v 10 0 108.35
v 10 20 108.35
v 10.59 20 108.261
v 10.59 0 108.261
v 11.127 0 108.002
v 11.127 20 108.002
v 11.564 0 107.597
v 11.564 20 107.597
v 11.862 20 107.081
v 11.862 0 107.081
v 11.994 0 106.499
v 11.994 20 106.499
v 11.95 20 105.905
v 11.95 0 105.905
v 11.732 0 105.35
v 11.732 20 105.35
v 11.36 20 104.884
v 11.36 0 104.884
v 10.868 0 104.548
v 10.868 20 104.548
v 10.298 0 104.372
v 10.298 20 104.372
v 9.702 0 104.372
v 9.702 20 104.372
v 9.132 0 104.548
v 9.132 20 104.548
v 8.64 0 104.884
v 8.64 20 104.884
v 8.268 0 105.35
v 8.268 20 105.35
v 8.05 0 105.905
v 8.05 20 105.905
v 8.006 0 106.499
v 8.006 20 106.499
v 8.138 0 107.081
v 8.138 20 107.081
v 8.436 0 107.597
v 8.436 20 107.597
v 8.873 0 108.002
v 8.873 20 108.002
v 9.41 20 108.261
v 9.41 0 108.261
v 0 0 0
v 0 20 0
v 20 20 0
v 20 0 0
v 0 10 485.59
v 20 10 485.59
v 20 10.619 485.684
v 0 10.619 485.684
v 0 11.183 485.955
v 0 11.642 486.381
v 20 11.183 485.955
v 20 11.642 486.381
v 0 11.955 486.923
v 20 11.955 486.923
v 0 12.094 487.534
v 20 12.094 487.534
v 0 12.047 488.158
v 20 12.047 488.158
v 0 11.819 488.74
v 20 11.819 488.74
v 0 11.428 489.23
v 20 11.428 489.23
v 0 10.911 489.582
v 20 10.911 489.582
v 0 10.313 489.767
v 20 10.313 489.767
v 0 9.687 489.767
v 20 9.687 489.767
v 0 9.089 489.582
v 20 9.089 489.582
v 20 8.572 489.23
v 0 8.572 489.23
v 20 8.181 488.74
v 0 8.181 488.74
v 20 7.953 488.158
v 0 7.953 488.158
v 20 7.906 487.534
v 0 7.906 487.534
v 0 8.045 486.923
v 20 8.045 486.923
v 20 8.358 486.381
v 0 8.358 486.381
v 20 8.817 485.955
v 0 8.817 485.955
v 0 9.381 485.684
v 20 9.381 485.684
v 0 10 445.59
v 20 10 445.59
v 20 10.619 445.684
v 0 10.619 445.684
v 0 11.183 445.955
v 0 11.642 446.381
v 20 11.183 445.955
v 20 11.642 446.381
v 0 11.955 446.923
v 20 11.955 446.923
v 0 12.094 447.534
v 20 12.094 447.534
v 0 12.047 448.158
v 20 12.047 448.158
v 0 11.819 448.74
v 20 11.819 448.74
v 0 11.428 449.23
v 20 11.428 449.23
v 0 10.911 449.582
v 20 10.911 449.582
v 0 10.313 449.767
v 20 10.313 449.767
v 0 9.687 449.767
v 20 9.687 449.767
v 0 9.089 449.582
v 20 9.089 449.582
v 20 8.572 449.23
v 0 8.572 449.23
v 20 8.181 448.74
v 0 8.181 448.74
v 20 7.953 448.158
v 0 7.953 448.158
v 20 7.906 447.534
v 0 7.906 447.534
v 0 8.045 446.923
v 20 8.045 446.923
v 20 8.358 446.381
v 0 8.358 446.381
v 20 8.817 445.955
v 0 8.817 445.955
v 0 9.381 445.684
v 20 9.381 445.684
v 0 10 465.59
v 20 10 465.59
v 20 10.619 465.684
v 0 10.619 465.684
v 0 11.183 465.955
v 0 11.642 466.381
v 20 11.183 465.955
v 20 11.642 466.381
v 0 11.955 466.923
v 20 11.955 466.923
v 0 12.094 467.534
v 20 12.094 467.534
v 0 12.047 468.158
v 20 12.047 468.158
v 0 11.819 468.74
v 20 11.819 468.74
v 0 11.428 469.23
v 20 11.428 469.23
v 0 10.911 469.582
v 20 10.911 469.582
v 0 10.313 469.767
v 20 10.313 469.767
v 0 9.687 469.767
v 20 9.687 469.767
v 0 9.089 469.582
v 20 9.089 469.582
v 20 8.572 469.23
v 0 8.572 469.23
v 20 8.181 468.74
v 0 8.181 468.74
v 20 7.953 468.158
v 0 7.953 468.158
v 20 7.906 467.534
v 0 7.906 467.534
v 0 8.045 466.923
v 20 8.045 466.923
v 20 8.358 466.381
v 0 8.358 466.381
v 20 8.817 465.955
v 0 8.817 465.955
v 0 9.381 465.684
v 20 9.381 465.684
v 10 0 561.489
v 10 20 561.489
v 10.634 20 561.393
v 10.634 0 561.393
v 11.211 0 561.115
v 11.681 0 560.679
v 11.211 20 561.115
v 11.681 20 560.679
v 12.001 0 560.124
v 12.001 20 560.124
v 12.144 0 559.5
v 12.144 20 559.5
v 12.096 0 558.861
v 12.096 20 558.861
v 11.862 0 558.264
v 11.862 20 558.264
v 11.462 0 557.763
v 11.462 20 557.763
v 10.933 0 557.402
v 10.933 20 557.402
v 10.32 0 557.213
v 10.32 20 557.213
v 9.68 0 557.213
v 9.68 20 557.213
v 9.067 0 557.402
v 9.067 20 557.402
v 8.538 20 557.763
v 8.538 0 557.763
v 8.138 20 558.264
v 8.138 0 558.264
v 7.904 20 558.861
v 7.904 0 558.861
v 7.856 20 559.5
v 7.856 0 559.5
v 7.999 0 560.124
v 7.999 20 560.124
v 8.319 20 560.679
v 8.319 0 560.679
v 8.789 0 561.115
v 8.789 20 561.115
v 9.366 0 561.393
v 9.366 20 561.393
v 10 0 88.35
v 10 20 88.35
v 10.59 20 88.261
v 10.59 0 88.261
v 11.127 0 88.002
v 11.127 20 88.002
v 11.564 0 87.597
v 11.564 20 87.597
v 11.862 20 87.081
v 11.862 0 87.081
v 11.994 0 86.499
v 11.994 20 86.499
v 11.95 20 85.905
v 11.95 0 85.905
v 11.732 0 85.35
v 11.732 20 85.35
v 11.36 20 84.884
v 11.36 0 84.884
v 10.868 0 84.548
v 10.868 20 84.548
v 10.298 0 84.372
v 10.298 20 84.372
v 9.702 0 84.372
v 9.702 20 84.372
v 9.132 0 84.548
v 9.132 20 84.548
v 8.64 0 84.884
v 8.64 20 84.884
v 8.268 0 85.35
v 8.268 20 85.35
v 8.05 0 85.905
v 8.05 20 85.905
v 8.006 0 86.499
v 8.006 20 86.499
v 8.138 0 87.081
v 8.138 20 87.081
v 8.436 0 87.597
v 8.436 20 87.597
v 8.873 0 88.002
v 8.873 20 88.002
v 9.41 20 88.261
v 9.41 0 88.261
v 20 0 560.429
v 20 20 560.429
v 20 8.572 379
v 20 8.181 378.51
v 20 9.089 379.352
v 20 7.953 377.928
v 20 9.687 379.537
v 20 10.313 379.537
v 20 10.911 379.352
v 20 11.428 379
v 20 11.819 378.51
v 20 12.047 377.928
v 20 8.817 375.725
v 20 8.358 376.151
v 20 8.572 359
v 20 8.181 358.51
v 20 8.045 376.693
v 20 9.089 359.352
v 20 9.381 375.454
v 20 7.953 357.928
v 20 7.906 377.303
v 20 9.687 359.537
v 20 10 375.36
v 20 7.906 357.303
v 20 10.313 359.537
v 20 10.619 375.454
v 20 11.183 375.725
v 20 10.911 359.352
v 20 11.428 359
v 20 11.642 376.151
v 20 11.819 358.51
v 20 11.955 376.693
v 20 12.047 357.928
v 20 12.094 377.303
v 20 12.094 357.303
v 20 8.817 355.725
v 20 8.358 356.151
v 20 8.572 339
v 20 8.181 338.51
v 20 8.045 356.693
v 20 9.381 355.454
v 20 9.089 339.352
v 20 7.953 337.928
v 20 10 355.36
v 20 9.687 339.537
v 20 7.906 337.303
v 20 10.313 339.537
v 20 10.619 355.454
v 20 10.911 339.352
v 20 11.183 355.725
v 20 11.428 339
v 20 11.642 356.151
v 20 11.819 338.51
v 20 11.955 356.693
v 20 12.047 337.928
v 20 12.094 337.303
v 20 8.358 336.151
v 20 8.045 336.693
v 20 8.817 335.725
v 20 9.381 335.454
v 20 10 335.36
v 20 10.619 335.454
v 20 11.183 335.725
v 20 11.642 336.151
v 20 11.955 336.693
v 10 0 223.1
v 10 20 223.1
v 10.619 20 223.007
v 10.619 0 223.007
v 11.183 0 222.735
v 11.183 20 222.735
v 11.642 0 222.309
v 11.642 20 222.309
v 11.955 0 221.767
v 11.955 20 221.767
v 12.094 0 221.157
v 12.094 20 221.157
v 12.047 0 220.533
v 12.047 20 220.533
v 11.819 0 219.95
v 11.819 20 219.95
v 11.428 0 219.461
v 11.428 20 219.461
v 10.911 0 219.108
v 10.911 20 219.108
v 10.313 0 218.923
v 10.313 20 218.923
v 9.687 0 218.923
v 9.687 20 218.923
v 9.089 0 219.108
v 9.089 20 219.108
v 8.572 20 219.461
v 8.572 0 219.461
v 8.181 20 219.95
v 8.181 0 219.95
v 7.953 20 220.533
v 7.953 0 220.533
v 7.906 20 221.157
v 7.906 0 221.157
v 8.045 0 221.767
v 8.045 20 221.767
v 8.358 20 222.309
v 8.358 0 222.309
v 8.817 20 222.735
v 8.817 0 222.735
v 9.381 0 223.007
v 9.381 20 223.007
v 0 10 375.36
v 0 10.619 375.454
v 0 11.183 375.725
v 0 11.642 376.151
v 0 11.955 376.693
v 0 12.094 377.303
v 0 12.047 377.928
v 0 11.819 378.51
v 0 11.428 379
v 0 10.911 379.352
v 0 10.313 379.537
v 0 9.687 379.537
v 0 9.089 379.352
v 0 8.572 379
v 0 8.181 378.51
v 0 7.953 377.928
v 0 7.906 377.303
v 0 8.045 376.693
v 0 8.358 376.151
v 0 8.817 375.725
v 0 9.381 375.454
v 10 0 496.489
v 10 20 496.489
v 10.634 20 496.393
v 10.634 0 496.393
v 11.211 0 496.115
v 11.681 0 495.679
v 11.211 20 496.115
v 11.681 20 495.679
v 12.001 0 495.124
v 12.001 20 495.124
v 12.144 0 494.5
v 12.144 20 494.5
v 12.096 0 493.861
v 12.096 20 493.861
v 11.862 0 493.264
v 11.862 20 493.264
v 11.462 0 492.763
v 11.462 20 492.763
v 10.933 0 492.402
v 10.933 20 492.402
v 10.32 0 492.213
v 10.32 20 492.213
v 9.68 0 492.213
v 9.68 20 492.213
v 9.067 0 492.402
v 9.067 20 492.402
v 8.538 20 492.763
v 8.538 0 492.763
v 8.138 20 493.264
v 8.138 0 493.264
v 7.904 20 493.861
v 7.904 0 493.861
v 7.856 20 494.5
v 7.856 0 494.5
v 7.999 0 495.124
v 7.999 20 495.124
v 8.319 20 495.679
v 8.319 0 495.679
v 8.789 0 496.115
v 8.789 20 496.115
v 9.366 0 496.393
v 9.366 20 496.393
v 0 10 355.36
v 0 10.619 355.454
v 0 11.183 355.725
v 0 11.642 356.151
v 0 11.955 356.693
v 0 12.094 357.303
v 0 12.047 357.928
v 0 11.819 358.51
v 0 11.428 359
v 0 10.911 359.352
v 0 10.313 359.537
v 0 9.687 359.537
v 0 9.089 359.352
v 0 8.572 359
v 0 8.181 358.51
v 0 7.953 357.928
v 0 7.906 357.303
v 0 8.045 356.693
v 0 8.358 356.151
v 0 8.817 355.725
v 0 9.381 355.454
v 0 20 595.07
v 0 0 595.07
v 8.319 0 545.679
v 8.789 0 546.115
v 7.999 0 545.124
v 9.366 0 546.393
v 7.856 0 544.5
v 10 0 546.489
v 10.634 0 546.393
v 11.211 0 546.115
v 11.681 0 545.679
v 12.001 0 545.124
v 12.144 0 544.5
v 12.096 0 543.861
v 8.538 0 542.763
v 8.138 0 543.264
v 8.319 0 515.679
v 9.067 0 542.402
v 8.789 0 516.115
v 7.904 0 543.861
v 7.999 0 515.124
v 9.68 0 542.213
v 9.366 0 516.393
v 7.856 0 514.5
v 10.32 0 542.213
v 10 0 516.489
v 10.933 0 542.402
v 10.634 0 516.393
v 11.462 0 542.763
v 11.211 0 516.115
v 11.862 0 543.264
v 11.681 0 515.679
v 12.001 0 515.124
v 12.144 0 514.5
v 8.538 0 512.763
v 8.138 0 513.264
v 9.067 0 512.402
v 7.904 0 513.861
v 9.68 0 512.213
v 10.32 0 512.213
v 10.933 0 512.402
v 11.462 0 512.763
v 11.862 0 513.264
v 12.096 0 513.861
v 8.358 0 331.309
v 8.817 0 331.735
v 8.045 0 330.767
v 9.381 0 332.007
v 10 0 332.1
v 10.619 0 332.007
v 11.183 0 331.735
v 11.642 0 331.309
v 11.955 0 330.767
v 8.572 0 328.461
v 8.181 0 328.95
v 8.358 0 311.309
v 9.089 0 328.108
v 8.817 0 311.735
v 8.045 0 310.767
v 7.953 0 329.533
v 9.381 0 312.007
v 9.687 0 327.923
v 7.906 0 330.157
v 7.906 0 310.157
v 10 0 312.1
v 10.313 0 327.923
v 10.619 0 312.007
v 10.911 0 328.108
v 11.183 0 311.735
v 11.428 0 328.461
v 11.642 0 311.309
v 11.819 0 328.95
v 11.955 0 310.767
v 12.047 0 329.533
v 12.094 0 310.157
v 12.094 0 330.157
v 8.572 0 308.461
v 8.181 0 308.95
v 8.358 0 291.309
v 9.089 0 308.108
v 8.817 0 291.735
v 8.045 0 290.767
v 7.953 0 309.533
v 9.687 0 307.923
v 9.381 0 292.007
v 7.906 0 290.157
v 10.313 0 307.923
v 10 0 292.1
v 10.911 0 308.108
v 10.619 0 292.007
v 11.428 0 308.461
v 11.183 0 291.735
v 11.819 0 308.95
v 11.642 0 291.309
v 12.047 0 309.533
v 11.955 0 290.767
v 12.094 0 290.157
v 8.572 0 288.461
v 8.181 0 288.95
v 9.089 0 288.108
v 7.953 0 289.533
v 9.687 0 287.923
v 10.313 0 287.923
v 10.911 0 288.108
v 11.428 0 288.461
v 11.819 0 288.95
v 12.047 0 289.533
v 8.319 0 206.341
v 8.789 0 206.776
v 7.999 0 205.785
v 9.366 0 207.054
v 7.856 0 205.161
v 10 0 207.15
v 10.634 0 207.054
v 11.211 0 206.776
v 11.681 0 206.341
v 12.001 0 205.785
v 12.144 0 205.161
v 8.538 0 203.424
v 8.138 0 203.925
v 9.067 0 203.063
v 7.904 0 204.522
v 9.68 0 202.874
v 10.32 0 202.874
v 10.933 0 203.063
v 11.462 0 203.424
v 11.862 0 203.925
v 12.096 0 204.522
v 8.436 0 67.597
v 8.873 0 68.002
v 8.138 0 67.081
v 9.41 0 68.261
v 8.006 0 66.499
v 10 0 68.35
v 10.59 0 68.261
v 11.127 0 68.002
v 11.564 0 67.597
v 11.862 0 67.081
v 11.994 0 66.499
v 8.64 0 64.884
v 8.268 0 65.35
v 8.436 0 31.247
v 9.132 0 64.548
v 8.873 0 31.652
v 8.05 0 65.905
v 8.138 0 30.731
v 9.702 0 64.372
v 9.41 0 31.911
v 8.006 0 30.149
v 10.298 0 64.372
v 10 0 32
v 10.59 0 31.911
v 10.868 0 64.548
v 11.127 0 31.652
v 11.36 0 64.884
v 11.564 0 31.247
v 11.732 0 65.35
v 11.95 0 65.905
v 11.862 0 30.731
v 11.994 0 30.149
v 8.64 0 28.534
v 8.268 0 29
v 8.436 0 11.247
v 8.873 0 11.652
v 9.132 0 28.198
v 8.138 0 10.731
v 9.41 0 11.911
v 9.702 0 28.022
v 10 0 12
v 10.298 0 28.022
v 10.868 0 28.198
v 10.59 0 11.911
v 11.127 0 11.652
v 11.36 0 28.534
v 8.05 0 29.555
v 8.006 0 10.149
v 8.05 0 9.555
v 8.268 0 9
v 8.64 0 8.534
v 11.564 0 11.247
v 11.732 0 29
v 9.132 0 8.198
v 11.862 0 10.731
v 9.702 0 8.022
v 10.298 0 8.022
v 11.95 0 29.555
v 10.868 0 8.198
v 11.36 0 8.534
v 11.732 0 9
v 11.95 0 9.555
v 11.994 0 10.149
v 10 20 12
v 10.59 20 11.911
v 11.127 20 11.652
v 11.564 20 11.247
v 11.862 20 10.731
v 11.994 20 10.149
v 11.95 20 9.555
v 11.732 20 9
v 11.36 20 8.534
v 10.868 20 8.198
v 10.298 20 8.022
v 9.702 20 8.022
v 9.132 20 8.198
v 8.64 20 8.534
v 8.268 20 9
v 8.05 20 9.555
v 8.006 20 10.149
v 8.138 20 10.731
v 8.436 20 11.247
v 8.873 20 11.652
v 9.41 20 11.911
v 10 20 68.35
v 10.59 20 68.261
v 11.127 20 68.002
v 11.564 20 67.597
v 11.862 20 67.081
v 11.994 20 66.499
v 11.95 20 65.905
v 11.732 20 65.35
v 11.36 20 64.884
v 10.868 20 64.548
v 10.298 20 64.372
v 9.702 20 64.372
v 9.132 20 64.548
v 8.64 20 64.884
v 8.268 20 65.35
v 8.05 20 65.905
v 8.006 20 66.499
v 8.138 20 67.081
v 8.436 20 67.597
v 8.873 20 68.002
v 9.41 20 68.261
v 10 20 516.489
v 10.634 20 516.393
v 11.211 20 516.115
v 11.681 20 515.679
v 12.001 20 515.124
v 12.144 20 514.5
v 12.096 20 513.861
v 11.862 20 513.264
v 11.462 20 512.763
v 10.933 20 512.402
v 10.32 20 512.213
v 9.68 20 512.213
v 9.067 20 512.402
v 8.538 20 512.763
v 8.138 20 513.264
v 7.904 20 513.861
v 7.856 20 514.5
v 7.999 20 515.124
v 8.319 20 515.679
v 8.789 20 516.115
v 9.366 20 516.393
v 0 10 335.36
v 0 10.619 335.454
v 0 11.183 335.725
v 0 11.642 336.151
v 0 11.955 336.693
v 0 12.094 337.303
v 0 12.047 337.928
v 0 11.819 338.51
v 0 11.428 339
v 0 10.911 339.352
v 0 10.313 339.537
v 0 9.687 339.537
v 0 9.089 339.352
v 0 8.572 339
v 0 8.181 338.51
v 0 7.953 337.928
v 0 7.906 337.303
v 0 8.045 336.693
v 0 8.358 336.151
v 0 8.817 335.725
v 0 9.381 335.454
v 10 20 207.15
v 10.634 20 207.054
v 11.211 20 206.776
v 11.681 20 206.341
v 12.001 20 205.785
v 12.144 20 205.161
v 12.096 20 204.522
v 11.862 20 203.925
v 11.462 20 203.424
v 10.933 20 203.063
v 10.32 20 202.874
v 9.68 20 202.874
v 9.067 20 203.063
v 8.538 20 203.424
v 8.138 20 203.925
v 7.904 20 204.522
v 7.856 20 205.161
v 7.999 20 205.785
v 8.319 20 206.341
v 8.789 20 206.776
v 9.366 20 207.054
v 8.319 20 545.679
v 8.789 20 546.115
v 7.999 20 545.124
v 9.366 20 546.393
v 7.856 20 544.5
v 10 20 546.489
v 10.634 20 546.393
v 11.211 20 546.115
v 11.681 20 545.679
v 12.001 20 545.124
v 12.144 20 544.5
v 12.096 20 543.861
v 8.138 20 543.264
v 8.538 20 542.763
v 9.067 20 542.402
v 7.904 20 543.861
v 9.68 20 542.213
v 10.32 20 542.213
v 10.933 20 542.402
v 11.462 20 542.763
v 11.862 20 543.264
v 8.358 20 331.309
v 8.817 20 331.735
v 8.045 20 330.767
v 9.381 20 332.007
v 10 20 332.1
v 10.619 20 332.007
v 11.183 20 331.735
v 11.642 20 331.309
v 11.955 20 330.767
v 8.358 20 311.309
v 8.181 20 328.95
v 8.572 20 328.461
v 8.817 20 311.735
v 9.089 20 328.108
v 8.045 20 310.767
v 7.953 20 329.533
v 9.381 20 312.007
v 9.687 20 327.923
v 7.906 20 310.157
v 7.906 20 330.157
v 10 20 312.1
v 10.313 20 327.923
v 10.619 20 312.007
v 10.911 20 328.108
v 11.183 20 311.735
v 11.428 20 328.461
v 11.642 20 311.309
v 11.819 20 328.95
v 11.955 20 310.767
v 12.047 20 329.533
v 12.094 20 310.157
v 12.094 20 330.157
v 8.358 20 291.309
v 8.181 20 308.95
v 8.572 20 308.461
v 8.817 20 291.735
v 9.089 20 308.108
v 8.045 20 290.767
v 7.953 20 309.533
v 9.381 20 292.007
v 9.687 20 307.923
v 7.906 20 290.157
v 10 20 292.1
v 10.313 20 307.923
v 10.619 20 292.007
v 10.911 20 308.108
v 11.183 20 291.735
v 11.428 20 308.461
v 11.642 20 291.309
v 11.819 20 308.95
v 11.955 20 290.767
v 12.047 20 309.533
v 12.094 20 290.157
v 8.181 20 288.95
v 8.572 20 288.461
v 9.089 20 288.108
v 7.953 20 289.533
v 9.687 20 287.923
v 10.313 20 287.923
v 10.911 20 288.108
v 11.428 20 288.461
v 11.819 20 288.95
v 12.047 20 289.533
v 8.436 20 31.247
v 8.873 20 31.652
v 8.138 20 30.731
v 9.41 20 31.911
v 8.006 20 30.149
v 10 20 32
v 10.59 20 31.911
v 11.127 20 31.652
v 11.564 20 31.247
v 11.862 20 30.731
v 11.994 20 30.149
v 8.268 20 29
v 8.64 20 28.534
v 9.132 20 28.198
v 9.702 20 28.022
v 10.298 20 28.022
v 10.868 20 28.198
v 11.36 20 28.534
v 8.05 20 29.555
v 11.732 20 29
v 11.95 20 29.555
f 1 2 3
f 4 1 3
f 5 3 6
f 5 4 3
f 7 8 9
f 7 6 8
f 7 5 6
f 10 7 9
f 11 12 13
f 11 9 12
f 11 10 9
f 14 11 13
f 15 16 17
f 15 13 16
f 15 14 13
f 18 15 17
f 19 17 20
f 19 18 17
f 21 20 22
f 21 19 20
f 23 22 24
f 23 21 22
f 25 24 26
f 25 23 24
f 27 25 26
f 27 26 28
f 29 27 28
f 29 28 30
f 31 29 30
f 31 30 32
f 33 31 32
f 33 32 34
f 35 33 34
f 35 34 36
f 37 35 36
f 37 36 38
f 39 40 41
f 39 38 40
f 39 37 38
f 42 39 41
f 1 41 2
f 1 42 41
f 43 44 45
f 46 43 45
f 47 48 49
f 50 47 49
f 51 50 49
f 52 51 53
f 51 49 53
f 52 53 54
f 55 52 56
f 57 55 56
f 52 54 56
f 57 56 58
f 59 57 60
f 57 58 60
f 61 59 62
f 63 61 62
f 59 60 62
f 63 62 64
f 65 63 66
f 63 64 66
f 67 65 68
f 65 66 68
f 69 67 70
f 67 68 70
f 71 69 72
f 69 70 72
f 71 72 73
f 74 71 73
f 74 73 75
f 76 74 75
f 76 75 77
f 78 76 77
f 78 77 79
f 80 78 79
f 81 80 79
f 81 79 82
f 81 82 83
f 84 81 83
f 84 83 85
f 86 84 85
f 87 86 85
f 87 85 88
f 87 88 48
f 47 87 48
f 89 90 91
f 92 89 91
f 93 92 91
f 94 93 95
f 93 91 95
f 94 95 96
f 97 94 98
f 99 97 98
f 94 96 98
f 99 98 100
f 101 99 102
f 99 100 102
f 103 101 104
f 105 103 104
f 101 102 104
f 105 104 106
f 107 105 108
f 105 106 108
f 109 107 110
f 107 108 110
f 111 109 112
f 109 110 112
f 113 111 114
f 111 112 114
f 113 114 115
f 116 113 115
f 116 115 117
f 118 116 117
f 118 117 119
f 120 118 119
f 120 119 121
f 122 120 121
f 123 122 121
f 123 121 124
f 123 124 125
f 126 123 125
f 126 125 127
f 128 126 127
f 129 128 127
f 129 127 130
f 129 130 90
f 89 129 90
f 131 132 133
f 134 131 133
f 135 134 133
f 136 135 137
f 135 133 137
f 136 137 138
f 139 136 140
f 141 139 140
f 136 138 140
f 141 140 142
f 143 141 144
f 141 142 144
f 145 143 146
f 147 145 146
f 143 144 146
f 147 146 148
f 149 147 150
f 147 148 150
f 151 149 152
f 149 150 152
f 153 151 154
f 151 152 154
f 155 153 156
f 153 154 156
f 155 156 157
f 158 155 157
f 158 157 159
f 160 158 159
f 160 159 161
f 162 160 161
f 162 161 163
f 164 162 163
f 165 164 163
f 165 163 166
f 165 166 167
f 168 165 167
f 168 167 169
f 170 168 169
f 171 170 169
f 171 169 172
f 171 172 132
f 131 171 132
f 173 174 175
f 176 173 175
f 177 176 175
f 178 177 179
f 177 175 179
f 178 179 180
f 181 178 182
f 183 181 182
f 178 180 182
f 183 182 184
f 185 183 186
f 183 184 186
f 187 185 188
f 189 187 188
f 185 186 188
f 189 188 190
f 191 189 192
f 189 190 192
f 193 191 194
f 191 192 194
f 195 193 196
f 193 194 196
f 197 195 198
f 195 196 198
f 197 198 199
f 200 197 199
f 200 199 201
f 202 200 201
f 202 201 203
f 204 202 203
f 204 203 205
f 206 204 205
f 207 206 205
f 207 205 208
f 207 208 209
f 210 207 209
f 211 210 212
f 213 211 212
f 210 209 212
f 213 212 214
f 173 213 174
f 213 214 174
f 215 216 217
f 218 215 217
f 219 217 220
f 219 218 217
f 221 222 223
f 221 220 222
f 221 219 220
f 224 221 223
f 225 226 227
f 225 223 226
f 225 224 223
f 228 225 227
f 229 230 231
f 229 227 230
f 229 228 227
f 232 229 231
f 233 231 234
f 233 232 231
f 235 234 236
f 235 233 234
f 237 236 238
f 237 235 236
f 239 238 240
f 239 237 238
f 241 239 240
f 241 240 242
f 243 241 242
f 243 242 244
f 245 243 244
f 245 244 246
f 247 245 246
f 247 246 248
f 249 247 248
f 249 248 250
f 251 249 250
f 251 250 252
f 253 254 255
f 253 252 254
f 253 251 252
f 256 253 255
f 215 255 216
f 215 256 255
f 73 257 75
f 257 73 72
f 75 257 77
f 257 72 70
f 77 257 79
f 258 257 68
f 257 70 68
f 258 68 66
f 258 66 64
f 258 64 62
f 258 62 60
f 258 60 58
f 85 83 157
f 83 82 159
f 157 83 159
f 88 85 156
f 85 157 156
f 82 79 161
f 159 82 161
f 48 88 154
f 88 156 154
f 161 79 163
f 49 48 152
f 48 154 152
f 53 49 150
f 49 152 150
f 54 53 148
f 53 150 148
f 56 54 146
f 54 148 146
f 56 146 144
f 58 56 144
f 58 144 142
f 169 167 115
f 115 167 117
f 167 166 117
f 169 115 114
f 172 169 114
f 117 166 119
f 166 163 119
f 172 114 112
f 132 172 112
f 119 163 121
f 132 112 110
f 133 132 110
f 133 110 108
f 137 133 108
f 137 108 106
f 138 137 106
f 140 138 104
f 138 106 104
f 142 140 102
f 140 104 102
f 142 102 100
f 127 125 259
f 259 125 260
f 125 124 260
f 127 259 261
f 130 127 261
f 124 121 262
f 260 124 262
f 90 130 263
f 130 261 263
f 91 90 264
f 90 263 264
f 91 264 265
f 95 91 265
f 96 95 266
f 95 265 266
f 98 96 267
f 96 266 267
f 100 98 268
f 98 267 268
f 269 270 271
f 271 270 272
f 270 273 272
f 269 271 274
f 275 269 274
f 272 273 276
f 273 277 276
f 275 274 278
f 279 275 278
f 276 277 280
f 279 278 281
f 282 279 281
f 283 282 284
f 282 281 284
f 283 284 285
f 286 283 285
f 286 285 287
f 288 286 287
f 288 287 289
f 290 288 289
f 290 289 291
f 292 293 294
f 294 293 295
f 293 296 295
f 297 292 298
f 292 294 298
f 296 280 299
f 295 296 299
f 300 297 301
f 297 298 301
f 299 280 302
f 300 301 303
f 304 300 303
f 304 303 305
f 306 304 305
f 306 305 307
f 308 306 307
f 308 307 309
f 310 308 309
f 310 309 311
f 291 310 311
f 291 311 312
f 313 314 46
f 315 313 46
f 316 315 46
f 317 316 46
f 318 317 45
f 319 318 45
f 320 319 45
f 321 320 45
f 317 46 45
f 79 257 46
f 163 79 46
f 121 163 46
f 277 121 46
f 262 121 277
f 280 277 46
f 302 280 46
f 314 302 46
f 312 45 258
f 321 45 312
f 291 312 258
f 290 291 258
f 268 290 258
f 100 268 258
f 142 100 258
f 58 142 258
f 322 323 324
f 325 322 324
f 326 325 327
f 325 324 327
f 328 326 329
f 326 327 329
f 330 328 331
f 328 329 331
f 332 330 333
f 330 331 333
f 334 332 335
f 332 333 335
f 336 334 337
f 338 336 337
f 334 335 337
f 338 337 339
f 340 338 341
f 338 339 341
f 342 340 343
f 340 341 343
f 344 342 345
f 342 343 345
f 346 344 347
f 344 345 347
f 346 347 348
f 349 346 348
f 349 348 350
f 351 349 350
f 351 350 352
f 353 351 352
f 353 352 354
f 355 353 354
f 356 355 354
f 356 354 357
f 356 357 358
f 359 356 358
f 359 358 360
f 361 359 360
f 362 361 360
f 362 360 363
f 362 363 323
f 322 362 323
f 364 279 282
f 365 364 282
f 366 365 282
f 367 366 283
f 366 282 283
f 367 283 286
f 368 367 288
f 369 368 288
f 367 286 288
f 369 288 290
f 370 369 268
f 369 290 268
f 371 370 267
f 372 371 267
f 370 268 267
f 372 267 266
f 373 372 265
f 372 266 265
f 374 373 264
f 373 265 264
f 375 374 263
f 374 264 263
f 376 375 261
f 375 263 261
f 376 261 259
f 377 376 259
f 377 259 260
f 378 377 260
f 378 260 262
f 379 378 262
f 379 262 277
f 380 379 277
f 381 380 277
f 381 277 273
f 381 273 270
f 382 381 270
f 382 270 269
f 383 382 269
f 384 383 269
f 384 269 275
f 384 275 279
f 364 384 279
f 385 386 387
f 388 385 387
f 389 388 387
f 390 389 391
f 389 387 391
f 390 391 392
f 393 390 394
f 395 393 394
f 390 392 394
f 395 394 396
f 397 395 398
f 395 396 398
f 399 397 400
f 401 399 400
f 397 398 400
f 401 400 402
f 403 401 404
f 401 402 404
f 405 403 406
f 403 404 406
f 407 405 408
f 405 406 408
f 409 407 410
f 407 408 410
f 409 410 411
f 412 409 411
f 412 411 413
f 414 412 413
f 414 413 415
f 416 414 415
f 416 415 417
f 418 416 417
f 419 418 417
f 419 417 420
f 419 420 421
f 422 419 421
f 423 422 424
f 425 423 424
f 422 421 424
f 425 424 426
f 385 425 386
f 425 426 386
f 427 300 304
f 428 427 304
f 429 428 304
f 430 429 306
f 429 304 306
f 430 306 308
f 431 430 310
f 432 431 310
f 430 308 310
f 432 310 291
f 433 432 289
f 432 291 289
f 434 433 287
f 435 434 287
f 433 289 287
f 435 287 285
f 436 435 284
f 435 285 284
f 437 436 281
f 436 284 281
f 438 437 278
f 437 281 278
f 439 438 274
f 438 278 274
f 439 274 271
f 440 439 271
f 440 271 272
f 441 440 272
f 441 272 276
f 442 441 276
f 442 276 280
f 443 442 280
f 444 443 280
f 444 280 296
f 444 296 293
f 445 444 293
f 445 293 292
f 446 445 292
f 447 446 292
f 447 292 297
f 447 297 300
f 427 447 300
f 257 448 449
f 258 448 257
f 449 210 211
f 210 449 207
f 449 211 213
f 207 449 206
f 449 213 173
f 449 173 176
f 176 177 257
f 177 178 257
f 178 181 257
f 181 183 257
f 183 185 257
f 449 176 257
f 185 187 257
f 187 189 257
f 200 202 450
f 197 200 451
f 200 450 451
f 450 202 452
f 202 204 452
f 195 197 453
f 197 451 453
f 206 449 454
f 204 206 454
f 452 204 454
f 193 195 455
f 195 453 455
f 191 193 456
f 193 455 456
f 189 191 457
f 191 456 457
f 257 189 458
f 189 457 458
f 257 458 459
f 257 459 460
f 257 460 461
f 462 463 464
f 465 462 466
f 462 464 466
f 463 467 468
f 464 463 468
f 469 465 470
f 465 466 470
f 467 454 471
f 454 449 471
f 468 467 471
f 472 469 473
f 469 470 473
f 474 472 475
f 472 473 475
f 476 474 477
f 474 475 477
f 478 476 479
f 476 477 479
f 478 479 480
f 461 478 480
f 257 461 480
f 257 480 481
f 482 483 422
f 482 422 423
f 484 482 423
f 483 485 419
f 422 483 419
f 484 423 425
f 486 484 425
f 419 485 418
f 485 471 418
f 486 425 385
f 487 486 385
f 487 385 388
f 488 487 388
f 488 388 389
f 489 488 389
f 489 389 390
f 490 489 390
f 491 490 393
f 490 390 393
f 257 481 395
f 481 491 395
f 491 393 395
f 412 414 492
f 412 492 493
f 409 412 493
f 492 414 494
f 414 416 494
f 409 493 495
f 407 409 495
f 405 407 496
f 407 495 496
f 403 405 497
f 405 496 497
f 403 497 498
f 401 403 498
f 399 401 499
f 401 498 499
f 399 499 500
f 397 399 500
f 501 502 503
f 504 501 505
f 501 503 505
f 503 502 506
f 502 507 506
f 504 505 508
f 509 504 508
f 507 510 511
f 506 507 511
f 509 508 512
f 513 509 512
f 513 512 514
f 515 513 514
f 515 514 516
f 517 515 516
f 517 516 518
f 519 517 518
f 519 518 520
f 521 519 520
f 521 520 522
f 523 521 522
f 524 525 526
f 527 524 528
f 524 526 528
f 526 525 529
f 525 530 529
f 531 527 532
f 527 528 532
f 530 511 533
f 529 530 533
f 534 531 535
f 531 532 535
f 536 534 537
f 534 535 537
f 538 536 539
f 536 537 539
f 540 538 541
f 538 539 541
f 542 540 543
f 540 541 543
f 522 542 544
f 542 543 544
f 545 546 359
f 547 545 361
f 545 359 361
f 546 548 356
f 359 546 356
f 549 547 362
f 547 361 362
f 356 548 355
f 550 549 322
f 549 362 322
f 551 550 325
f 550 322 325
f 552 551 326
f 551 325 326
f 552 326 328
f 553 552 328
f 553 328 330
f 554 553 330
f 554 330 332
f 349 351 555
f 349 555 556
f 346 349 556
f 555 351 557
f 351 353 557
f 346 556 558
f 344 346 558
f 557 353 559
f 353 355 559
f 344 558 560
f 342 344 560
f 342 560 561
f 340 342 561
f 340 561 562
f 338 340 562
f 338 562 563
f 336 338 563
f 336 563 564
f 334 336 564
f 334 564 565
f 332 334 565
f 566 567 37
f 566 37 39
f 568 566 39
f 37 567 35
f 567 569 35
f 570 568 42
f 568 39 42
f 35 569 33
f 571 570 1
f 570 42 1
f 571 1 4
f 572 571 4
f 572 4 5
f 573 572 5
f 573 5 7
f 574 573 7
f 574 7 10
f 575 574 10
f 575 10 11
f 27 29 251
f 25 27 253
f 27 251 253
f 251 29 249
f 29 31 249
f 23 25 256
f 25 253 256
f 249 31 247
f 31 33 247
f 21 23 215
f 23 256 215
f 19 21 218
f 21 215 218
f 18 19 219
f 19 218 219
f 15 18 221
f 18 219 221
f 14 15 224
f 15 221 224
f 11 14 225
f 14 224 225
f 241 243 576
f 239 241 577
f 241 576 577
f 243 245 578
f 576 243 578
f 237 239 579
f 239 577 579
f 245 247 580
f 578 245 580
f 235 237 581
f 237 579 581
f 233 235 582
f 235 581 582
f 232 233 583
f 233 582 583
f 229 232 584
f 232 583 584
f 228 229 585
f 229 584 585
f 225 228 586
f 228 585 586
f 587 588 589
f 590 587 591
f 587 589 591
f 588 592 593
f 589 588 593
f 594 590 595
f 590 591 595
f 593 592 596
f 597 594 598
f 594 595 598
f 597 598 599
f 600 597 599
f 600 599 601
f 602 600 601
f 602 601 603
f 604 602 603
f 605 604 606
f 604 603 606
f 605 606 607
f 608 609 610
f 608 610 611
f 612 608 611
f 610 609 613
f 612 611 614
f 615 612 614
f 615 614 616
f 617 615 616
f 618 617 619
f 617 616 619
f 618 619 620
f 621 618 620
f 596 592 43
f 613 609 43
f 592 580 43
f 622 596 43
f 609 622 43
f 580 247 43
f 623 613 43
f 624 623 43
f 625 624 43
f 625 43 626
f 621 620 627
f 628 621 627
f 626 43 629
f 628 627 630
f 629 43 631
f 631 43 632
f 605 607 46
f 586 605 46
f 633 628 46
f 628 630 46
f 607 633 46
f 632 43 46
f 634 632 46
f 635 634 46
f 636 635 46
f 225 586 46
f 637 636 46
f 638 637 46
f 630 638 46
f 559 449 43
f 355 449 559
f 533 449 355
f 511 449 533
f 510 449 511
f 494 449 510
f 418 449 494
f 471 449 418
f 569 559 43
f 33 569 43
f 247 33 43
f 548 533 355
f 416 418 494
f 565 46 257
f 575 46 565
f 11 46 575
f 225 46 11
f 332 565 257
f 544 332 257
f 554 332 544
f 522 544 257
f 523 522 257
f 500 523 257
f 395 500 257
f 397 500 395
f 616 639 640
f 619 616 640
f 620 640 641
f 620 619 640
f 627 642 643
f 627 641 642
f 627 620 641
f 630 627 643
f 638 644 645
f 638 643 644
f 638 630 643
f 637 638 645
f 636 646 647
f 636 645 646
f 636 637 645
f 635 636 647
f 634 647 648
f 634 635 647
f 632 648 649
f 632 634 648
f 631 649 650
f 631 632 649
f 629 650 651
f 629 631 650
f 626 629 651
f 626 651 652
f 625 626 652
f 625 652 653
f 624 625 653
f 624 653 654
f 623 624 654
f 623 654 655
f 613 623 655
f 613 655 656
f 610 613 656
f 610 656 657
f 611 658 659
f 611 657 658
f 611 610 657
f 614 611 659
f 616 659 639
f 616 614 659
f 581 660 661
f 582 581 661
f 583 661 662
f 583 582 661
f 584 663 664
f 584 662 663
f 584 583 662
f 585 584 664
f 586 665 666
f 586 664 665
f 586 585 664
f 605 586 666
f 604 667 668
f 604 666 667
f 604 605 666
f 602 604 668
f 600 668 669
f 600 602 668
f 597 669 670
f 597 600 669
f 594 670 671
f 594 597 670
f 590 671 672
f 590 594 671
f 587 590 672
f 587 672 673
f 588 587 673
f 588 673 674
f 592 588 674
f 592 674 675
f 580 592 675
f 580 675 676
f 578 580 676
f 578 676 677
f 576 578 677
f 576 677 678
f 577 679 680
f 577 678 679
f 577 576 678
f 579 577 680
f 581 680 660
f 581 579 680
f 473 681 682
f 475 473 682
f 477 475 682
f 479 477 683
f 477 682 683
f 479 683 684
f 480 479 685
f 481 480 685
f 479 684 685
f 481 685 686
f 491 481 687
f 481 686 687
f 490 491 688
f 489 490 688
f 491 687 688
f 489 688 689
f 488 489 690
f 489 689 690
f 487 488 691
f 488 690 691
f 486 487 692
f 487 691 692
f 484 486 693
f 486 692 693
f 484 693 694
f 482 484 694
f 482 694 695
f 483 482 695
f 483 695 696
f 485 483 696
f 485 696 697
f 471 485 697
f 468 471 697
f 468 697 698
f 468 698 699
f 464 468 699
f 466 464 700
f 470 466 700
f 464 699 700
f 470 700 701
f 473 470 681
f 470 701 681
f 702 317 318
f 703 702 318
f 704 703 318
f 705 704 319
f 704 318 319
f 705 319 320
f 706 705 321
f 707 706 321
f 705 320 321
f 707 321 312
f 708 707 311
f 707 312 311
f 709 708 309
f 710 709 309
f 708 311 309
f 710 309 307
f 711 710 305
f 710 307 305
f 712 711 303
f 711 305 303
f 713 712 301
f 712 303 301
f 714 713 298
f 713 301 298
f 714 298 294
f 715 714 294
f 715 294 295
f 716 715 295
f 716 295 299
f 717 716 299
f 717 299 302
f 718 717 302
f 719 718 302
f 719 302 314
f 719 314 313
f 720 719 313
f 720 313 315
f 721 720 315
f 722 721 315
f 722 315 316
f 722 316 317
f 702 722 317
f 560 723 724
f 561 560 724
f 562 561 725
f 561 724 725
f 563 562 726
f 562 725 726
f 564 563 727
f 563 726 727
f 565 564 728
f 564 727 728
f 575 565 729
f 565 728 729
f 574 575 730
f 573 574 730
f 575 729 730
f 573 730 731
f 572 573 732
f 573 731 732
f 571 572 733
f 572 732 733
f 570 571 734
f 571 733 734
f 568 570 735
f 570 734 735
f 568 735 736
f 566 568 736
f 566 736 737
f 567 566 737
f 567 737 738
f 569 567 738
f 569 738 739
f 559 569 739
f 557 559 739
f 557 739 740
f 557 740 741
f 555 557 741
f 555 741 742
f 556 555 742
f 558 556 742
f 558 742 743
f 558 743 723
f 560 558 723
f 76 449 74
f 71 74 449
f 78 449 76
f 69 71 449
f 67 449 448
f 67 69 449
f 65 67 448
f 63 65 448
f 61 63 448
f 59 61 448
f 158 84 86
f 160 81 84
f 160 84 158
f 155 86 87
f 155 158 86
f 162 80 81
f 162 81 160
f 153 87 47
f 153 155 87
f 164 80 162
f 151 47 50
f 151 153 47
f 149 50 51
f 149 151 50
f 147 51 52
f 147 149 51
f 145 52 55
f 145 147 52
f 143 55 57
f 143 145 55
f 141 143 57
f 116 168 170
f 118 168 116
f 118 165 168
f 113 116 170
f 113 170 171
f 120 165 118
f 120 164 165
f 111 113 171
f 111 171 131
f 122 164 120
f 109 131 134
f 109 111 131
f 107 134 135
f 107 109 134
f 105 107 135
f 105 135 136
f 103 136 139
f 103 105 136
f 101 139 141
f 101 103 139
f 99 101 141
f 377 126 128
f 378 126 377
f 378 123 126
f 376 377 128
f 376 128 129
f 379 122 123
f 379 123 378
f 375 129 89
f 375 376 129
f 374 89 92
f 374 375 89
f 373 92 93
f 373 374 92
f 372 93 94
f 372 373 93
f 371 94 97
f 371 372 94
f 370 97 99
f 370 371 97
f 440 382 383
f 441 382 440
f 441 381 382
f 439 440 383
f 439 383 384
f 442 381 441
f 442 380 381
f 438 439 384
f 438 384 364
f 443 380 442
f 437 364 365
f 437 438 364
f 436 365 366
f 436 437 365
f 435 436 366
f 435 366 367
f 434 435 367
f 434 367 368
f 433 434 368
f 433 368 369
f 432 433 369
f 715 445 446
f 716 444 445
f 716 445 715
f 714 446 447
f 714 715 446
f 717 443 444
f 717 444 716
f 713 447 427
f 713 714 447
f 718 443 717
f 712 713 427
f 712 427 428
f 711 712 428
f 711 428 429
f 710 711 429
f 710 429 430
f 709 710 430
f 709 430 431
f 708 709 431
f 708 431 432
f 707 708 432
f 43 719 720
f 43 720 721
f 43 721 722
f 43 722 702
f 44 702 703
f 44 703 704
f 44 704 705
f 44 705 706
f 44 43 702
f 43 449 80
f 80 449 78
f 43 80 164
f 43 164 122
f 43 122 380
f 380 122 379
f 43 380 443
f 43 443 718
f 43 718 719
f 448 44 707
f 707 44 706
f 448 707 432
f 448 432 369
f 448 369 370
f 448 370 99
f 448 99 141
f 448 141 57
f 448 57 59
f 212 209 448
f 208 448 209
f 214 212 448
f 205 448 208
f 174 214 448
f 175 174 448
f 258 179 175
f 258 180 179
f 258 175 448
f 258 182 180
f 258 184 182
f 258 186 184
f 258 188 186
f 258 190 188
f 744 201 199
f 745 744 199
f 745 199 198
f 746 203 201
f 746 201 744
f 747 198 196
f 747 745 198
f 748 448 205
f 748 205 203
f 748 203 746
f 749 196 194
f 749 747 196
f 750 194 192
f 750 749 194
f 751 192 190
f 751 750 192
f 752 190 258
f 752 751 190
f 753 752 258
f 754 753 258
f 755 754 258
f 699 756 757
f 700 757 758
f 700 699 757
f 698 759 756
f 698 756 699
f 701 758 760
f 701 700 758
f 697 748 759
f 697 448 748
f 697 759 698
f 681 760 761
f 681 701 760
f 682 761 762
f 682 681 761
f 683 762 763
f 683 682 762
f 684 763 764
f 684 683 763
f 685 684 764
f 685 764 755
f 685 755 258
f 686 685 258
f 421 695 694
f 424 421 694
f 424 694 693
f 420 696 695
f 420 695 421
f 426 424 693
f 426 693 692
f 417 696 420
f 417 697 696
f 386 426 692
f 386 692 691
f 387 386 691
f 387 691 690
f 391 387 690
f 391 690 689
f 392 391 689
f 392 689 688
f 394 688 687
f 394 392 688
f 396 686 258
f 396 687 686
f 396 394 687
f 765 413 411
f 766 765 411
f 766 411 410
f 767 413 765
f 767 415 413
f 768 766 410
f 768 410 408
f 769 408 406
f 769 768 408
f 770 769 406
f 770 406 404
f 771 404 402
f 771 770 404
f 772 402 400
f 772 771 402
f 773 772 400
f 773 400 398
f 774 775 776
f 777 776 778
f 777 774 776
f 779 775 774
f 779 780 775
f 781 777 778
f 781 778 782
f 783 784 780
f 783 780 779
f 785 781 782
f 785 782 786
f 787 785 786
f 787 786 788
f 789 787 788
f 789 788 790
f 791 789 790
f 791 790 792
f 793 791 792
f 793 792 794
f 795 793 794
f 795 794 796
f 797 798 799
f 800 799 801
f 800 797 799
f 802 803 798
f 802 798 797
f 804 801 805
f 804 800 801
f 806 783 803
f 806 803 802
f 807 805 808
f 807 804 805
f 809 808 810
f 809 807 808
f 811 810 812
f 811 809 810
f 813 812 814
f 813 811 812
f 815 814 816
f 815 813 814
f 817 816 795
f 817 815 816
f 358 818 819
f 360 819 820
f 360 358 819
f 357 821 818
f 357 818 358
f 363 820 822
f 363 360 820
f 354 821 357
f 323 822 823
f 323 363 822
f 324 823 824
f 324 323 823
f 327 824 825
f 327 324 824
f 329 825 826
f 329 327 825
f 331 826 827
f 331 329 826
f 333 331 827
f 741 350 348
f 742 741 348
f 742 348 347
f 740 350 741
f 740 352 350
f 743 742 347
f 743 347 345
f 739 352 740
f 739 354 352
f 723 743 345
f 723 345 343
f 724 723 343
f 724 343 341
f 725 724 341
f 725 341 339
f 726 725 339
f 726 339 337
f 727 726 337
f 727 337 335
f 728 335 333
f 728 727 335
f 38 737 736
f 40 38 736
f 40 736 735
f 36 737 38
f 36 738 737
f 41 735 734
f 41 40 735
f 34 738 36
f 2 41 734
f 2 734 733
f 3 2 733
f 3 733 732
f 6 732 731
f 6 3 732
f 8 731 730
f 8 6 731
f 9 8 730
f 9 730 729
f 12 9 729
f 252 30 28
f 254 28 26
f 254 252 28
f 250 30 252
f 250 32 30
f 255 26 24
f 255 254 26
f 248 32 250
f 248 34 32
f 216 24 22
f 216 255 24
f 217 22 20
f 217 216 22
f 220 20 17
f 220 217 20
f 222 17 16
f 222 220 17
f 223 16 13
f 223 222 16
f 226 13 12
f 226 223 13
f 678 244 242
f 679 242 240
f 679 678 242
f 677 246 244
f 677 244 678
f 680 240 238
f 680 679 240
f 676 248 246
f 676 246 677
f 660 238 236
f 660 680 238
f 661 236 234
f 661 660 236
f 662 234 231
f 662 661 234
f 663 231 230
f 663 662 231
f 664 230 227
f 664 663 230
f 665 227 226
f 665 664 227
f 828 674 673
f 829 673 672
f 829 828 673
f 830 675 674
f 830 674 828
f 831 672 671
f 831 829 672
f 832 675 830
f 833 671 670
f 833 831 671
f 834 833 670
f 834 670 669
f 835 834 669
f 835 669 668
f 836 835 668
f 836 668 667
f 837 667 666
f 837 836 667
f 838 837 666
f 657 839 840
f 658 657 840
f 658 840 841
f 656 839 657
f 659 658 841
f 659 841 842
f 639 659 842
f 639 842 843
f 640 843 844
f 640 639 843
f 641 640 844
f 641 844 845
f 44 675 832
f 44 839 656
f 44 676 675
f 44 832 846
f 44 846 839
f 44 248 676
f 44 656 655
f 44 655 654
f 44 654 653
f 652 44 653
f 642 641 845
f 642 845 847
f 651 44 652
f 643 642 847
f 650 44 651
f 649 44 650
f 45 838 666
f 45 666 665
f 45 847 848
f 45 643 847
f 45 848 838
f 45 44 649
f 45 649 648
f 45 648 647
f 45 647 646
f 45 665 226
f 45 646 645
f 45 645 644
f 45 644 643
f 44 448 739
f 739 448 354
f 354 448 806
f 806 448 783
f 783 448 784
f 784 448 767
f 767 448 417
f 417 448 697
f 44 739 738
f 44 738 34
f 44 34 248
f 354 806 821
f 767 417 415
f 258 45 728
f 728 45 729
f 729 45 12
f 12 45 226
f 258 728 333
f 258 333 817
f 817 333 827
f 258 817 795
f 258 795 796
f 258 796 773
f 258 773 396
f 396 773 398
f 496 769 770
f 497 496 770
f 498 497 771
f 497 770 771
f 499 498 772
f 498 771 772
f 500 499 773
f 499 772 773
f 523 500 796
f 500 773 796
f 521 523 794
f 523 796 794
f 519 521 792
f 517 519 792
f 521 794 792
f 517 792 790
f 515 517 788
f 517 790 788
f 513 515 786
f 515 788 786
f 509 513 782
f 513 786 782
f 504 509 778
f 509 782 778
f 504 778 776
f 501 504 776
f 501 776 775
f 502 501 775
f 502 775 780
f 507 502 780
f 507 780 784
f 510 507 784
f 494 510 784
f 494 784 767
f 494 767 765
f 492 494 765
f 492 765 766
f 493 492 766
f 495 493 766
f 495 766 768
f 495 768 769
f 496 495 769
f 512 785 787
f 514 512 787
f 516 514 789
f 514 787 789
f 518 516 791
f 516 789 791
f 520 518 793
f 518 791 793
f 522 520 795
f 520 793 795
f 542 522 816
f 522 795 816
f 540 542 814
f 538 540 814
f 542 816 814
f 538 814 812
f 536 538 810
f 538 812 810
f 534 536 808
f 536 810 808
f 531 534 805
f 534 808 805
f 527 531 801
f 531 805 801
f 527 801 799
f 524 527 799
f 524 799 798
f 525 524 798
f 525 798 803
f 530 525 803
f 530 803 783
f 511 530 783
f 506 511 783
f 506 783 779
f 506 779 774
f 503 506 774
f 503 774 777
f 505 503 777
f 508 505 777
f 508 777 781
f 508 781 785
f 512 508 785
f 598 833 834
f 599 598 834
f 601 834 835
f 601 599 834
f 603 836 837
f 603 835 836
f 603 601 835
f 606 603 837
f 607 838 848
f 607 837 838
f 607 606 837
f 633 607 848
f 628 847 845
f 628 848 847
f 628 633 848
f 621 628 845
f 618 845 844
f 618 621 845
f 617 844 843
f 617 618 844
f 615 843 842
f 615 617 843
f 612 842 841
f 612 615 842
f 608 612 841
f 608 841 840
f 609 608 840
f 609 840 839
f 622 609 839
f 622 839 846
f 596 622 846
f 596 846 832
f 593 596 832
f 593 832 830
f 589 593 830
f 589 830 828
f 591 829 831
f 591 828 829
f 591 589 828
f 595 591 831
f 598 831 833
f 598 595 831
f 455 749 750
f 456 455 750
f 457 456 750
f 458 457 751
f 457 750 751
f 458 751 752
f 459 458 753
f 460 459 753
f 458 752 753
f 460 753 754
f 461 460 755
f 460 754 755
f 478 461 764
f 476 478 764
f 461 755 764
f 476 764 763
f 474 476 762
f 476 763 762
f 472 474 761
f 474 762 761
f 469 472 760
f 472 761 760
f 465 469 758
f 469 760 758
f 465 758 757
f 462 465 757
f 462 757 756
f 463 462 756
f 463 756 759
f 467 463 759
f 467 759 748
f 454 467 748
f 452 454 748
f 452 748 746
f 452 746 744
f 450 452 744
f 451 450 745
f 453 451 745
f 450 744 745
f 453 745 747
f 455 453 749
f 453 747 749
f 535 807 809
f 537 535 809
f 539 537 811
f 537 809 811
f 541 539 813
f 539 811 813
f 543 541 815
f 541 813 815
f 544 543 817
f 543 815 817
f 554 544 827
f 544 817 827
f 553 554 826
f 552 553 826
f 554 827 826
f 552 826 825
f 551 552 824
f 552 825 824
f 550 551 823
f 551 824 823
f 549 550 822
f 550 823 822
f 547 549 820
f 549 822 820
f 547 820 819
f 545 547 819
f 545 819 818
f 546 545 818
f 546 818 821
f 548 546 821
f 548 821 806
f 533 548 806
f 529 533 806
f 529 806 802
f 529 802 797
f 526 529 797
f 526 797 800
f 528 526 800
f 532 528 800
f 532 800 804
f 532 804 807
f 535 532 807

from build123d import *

# Parameters (mm, degrees)
SKETCH_1_W               = 20
SKETCH_1_H               = 20
EXTRUDE_1_DEPTH          = 595.07
CUT_EXTRUDE_1_DEPTH      = 595.07
CUT_EXTRUDE_2_DEPTH      = 596.741810603
CUT_EXTRUDE_2_DEPTH_BACK = 596.741810603
SKETCH_3_R               = 2
SKETCH_4_R               = 2.15
CUT_EXTRUDE_3_DEPTH      = 20
SKETCH_5_R               = 2.15
SKETCH_5_R_2             = 2.1
CUT_EXTRUDE_4_DEPTH      = 137
SKETCH_9_R               = 2.1
CUT_EXTRUDE_5_DEPTH      = 32


with BuildPart() as part:
    # 草图1 → 凸台-拉伸1 (new body)
    with BuildSketch(Plane.XY):
        with Locations((10, 10)):
            Rectangle(SKETCH_1_W, SKETCH_1_H)
    extrude(amount=EXTRUDE_1_DEPTH)

    # 草图2 → 切除-拉伸1 (cut)
    with BuildSketch(Plane(origin=(0, 20, 0), x_dir=(1, 0, 0), z_dir=(0, 1, 0))):
        Polygon((0, -595.07), (20, -560.428983849), (20, -595.07), align=None)
    extrude(amount=-CUT_EXTRUDE_1_DEPTH, mode=Mode.SUBTRACT)

    # 草图3 → 切除-拉伸2 (cut, two sides: drawn at the far end of the back side and taken through both)
    with BuildSketch(Plane(origin=(0, 20, 0), x_dir=(1, 0, 0), z_dir=(0, 1, 0)).offset(-CUT_EXTRUDE_2_DEPTH_BACK)):
        with Locations(Location((10, -10, 0), (0, 0, 270))):
            Circle(SKETCH_3_R)
        with Locations(Location((10, -30, 0), (0, 0, 270))):
            Circle(SKETCH_3_R)
        with Locations(Location((10, -66.35, 0), (0, 0, 270))):
            Circle(SKETCH_3_R)
        with Locations(Location((10, -86.35, 0), (0, 0, 270))):
            Circle(SKETCH_3_R)
        with Locations(Location((10, -106.35, 0), (0, 0, 270))):
            Circle(SKETCH_3_R)
    extrude(amount=CUT_EXTRUDE_2_DEPTH + CUT_EXTRUDE_2_DEPTH_BACK, mode=Mode.SUBTRACT)

    # 草图4 → 切除-拉伸3 (cut)
    with BuildSketch(Plane(origin=(0, 20, 0), x_dir=(1, 0, 0), z_dir=(0, 1, 0))):
        with Locations(Location((10, -544.338983849, 0), (0, 0, 270))):
            Circle(SKETCH_4_R)
        with Locations(Location((10, -559.338983849, 0), (0, 0, 270))):
            Circle(SKETCH_4_R)
        with Locations(Location((10, -514.338983849, 0), (0, 0, 270))):
            Circle(SKETCH_4_R)
        with Locations(Location((10, -494.338983849, 0), (0, 0, 270))):
            Circle(SKETCH_4_R)
    extrude(amount=-CUT_EXTRUDE_3_DEPTH, mode=Mode.SUBTRACT)

    # 草图5 → 切除-拉伸4 (cut)
    with BuildSketch(Plane(origin=(0, 20, 0), x_dir=(1, 0, 0), z_dir=(0, 1, 0))):
        with Locations(Location((10, -205, 0), (0, 0, 270))):
            Circle(SKETCH_5_R)
        with Locations(Location((10, -221, 0), (0, 0, 270))):
            Circle(SKETCH_5_R_2)
        with Locations(Location((10, -310, 0), (0, 0, 270))):
            Circle(SKETCH_5_R_2)
        with Locations(Location((10, -290, 0), (0, 0, 270))):
            Circle(SKETCH_5_R_2)
        with Locations(Location((10, -330, 0), (0, 0, 270))):
            Circle(SKETCH_5_R_2)
    extrude(amount=-CUT_EXTRUDE_4_DEPTH, mode=Mode.SUBTRACT)

    # 草图9 → 切除-拉伸5 (cut)
    with BuildSketch(Plane(origin=(20, 0, 0), x_dir=(0, 0, -1), z_dir=(1, 0, 0))):
        with Locations((-467.690453805, 10)):
            Circle(SKETCH_9_R)
        with Locations((-487.690453805, 10)):
            Circle(SKETCH_9_R)
        with Locations((-447.690453805, 10)):
            Circle(SKETCH_9_R)
        with Locations((-357.460423925, 10)):
            Circle(SKETCH_9_R)
        with Locations((-377.460423925, 10)):
            Circle(SKETCH_9_R)
        with Locations((-337.460423925, 10)):
            Circle(SKETCH_9_R)
    extrude(amount=-CUT_EXTRUDE_5_DEPTH, mode=Mode.SUBTRACT)


solid = part.part
